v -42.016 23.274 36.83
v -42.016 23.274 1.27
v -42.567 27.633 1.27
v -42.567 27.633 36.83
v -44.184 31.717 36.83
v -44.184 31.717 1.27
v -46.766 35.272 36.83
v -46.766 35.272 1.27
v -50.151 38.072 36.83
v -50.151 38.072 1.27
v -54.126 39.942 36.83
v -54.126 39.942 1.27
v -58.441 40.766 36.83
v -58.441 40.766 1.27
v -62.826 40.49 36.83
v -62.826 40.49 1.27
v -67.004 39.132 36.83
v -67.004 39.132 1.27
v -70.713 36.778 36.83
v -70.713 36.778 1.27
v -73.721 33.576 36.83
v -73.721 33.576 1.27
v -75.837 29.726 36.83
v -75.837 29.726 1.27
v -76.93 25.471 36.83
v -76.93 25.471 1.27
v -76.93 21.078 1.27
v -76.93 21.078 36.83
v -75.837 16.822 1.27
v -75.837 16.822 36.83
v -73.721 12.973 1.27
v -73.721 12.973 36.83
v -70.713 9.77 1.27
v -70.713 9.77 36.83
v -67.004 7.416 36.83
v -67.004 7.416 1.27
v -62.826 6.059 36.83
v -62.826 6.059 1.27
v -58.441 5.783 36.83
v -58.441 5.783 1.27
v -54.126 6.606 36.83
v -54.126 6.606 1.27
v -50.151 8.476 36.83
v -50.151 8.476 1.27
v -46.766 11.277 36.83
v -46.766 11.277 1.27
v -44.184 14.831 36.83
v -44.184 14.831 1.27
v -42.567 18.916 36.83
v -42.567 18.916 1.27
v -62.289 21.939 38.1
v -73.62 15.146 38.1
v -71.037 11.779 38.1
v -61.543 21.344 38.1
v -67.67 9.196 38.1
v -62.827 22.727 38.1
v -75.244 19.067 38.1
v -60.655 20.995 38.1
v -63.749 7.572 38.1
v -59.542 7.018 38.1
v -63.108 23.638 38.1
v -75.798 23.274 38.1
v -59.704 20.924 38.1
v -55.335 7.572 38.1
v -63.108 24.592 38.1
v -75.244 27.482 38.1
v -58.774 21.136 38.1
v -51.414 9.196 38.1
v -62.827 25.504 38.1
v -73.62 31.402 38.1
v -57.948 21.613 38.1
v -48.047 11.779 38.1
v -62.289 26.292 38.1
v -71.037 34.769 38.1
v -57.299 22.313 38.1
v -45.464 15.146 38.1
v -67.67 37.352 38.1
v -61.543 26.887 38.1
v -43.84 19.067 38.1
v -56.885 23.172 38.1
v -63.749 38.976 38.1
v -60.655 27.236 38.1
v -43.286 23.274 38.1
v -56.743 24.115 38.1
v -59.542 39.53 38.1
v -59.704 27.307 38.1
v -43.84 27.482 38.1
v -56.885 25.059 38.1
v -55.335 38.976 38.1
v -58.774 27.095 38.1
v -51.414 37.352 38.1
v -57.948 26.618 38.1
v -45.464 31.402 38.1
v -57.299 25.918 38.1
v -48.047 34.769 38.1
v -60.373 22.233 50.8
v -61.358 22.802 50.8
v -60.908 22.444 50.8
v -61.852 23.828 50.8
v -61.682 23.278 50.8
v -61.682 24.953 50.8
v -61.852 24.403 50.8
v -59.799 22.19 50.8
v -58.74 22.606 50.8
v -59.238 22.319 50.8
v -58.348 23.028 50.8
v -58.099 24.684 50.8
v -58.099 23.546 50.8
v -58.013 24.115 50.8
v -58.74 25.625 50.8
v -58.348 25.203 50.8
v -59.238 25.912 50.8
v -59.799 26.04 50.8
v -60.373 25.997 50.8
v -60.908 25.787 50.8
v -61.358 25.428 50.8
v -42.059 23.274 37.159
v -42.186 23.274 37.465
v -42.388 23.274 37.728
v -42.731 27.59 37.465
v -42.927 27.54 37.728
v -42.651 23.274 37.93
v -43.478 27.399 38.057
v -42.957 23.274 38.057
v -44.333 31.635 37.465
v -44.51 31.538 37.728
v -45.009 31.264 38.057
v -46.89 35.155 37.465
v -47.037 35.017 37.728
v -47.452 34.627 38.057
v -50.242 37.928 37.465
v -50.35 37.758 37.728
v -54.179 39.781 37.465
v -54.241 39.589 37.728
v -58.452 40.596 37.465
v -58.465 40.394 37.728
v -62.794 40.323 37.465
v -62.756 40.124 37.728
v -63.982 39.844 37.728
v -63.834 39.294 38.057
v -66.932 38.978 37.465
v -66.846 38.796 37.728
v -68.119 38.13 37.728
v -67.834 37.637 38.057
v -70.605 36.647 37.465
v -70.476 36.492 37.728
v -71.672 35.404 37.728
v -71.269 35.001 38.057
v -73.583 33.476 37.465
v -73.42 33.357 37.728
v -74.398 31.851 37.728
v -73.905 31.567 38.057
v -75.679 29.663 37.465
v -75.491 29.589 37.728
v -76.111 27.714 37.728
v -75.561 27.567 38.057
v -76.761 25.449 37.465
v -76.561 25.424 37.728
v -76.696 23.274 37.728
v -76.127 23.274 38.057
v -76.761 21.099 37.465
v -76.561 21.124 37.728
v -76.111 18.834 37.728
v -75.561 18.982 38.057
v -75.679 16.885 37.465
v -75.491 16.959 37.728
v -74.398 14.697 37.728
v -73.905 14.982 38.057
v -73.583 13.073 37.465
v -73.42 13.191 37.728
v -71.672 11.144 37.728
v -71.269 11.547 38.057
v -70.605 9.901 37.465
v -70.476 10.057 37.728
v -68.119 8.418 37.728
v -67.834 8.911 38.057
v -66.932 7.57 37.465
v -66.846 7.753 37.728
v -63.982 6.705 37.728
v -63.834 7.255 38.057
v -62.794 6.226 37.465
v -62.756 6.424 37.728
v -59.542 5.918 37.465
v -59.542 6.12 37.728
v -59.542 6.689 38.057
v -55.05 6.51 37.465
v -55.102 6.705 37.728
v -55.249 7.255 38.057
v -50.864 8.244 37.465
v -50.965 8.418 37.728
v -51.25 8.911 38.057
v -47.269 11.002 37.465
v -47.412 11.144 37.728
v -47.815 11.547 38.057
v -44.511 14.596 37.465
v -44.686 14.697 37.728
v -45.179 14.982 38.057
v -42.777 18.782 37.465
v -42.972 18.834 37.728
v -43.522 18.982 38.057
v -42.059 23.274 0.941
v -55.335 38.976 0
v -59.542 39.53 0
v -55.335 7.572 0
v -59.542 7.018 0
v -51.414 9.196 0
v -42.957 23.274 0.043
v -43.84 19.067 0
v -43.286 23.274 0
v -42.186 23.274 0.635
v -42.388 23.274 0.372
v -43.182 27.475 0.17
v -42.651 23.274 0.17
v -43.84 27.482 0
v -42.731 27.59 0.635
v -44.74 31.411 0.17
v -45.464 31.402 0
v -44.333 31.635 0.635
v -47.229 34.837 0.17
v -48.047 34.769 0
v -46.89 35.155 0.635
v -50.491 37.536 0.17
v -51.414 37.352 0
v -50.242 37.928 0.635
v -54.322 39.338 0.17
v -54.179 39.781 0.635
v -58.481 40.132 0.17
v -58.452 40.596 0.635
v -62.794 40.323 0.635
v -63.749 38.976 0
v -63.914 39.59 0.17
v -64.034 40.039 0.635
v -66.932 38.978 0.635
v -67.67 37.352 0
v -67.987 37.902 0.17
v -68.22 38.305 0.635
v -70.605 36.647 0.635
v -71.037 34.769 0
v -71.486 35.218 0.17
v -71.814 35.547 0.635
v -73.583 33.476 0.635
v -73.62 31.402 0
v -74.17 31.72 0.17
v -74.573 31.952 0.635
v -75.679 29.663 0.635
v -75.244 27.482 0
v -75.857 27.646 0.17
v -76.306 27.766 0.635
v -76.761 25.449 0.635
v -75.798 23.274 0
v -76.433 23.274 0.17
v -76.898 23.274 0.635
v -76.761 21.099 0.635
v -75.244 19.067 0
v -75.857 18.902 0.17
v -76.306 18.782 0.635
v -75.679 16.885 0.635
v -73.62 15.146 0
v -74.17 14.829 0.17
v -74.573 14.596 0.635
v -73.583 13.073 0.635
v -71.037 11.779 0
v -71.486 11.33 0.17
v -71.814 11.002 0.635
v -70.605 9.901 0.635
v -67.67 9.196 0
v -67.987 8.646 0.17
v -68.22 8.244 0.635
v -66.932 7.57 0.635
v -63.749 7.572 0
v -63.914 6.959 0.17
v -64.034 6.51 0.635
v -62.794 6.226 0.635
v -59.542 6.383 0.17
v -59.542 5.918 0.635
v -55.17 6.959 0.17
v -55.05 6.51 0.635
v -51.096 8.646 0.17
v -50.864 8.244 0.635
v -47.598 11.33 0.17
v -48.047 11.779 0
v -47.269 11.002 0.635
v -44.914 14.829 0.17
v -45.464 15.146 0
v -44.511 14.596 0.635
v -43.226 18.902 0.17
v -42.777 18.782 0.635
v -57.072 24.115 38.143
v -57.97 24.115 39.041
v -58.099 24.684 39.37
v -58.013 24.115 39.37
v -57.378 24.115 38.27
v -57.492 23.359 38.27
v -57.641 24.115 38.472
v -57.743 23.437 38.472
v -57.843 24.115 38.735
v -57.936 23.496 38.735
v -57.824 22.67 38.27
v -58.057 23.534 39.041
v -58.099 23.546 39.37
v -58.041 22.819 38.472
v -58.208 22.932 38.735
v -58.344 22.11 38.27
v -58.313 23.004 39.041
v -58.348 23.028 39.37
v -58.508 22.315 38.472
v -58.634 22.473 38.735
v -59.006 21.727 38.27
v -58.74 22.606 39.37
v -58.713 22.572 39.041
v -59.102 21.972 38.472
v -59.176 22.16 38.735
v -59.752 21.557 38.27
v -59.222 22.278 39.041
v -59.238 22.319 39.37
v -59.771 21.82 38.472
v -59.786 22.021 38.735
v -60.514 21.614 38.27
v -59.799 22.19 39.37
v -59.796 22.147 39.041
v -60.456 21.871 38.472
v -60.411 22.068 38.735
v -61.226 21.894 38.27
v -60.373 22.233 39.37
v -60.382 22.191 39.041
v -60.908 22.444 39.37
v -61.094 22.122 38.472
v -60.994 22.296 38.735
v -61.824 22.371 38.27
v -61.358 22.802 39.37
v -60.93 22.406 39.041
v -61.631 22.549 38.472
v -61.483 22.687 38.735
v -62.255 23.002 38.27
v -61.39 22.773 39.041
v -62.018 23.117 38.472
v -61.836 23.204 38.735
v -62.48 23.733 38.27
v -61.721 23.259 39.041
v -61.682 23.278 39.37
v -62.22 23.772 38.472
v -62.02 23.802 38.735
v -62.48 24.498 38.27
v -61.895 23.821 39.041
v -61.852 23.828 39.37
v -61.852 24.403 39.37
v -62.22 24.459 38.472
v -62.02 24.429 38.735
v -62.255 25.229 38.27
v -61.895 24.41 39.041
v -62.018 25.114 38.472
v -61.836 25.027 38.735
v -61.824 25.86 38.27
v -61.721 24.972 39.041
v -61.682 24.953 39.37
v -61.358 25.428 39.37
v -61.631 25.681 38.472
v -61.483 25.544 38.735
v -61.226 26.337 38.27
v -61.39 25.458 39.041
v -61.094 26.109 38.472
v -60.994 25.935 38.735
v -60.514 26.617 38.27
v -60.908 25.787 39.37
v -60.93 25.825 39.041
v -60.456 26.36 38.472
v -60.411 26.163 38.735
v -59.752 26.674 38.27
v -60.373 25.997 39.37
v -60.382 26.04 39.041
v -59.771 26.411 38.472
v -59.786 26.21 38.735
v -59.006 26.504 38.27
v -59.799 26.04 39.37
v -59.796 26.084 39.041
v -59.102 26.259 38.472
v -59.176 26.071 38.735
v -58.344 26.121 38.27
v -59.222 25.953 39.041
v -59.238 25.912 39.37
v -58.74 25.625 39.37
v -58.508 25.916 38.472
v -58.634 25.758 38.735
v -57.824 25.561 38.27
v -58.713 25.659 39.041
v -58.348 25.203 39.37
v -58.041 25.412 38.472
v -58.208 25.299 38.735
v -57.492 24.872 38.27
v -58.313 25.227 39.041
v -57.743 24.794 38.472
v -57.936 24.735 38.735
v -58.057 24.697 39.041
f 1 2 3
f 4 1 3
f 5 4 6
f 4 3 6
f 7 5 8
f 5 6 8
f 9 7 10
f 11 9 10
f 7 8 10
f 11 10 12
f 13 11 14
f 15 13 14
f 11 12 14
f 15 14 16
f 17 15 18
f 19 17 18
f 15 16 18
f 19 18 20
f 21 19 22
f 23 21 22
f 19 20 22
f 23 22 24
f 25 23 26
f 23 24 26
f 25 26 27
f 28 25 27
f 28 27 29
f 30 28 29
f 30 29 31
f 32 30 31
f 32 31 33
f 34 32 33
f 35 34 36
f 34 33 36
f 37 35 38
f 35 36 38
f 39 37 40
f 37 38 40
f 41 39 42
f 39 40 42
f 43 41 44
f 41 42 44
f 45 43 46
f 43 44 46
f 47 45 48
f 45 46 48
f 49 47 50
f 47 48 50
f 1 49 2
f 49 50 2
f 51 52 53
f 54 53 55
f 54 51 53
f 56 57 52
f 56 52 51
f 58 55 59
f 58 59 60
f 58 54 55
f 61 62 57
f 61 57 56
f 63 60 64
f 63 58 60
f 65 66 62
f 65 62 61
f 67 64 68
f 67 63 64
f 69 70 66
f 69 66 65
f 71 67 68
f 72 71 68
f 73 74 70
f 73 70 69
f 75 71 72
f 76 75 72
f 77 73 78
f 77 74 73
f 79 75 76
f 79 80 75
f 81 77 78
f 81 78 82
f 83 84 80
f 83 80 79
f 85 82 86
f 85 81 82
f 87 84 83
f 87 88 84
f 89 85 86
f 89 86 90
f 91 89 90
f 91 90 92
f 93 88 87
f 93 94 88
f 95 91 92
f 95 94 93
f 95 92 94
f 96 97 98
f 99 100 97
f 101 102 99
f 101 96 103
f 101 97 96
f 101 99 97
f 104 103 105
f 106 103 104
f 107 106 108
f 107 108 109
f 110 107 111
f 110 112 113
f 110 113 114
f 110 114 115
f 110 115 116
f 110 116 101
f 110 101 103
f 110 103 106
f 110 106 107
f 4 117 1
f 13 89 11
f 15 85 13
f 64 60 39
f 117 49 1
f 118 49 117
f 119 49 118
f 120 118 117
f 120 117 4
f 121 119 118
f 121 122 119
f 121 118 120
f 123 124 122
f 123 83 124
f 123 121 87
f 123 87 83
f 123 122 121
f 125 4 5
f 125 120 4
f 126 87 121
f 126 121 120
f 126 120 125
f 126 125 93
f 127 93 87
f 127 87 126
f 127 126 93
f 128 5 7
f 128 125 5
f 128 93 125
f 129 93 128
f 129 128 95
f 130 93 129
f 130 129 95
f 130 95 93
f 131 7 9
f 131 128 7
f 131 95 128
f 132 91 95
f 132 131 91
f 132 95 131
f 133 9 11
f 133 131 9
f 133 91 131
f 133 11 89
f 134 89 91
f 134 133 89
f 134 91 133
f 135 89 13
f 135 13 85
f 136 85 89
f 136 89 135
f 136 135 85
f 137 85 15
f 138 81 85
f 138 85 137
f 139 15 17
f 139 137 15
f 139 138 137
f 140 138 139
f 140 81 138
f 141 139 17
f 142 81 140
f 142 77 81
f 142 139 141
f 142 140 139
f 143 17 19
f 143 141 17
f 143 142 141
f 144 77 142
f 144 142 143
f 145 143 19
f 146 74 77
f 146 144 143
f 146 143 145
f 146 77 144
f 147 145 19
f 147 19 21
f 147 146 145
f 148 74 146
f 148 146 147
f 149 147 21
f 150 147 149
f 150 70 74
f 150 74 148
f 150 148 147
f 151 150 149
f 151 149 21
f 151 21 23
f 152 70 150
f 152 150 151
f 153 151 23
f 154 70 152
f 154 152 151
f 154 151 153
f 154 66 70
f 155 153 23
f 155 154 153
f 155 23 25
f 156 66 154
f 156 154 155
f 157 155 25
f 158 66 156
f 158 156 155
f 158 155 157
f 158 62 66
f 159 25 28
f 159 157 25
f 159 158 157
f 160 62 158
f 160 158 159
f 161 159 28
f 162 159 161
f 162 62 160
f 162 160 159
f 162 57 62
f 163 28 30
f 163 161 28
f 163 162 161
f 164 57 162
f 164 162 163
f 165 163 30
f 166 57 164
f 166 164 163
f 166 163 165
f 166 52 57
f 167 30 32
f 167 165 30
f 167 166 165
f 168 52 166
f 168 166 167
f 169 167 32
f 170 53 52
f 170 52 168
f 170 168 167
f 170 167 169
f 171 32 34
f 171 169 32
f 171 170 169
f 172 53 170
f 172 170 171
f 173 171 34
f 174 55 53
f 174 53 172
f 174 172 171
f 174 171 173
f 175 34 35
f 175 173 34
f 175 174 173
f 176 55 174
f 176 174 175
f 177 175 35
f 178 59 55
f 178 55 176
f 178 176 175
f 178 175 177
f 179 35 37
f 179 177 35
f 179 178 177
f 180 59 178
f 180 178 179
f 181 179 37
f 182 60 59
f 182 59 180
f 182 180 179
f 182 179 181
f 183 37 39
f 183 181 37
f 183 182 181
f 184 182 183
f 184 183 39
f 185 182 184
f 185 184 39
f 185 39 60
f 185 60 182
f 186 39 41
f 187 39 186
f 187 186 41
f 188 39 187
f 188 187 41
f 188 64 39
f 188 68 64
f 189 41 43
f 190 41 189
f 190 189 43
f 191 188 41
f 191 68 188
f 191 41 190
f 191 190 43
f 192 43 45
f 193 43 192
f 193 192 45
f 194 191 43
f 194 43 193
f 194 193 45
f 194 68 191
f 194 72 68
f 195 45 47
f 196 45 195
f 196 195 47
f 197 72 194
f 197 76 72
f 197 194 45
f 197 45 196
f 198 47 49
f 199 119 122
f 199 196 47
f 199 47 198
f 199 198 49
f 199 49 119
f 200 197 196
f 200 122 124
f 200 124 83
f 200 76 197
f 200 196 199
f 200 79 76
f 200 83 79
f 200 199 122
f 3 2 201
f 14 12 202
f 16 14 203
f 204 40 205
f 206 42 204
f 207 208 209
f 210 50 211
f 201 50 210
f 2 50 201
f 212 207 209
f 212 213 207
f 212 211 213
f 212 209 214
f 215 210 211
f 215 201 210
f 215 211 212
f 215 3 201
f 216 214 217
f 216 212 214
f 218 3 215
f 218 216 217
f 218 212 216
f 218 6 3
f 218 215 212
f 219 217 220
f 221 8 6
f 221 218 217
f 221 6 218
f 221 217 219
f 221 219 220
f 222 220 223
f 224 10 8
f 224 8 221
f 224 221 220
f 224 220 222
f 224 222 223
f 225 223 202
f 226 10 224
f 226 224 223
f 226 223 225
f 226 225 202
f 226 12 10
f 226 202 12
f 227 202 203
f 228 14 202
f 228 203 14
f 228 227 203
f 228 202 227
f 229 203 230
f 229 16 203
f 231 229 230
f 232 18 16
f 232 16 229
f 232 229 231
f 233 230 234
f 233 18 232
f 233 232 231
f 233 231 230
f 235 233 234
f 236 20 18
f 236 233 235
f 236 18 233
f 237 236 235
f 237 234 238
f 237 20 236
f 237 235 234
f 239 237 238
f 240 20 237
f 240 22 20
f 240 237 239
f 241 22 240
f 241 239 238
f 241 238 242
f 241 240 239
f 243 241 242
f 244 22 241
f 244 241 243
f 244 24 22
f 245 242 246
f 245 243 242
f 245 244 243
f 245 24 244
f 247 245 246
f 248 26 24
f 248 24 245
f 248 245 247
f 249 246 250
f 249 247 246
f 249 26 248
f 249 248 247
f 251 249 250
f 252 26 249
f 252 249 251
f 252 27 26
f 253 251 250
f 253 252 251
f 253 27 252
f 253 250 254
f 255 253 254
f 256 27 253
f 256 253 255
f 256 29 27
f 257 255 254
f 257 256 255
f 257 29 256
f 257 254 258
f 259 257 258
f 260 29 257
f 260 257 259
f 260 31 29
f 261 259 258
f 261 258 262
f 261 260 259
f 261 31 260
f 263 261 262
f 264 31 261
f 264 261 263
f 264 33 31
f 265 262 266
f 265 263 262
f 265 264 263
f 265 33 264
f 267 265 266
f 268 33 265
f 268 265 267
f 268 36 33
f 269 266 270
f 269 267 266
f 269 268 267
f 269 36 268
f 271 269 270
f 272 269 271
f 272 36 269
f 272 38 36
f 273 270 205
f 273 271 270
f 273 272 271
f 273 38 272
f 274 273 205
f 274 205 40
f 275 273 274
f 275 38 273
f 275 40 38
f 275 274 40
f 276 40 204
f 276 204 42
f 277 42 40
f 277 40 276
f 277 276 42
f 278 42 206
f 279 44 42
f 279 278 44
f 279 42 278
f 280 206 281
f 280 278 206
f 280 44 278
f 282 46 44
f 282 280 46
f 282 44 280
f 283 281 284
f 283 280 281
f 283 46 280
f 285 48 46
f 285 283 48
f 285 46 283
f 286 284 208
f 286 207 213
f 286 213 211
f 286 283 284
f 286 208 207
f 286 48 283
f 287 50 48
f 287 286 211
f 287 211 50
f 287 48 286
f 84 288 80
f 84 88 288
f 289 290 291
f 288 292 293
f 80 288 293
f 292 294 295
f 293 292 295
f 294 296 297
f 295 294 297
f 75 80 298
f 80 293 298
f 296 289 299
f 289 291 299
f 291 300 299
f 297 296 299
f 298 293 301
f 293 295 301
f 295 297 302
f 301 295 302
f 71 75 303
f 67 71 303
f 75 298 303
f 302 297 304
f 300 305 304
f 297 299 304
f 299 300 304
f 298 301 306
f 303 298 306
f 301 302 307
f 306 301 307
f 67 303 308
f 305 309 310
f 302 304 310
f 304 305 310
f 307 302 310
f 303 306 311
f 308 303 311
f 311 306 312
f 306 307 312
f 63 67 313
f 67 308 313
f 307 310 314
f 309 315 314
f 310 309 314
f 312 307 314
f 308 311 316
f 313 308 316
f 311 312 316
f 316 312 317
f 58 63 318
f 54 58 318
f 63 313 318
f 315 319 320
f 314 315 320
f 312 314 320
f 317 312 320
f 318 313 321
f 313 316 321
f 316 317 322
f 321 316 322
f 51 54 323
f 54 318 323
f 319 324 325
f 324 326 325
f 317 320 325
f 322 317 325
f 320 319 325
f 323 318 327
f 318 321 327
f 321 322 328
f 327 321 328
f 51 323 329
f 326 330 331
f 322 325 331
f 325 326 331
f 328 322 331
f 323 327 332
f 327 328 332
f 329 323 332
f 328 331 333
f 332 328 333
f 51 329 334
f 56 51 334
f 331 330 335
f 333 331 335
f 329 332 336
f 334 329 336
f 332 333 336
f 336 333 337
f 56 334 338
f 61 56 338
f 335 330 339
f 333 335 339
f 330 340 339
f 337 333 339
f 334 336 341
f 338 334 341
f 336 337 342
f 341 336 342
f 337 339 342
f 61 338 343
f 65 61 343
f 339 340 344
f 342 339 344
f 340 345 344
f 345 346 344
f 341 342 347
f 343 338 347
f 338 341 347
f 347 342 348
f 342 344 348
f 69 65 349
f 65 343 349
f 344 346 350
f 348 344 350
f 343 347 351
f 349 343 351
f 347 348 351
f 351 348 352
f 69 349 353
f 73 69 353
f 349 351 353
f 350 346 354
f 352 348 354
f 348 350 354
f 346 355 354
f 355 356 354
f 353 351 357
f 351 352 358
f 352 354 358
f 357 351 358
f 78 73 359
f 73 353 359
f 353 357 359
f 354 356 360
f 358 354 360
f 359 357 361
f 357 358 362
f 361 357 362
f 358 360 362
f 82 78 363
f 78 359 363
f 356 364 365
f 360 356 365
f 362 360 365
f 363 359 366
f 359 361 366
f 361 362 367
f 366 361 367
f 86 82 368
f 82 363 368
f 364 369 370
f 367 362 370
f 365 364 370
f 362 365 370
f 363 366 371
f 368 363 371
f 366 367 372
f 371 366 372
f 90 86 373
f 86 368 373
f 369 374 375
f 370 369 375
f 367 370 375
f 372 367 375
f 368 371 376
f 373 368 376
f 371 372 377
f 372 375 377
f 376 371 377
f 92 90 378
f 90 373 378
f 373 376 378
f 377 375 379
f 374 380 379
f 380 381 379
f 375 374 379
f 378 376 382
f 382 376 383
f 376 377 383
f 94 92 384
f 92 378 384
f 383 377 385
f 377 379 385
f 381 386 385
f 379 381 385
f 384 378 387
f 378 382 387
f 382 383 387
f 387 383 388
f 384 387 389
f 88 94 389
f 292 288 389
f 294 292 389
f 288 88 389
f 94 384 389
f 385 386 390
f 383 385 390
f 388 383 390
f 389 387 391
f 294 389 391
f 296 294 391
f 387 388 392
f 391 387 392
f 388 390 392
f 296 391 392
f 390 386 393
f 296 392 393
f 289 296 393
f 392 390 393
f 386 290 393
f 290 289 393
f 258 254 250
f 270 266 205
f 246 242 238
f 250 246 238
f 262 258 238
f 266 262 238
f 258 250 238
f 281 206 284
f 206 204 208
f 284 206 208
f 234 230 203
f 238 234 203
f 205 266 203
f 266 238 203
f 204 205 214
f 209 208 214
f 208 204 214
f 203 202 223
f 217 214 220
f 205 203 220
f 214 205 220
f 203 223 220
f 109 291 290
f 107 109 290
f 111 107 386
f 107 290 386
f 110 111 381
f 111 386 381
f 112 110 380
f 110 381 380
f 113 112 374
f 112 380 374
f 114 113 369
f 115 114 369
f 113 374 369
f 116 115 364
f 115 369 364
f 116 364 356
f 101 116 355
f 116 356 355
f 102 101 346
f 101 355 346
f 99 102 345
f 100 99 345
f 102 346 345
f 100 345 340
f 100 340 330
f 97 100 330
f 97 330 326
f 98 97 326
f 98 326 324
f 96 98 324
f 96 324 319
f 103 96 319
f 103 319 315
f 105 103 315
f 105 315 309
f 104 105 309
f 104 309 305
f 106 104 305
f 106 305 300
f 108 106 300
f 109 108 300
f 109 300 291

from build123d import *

# Parameters (mm, degrees)
F0_R     = 17.526
F1_DEPTH = 38.1
F2_R     = 1.9304
F3_DEPTH = 50.8
F4_R     = 1.27


with BuildPart() as f1:
    # F0 (on Top) → F1 (new body)
    with BuildSketch(Plane.XY):
        with Locations((-59.5418959856, 23.2741720974)):
            Circle(F0_R)
    extrude(amount=F1_DEPTH)

    # F2 (on Top) → F3 (join)
    with BuildSketch(Plane.XY):
        with Locations((-59.9432475865, 24.1154804826)):
            Circle(F2_R)
    extrude(amount=F3_DEPTH)

    # F4
    f4_edges = [f1.edges().sort_by_distance(p)[0] for p in [
        (-77.067896, 23.274172, 38.1),
        (-61.873648, 24.11548, 38.1),
        (-77.067896, 23.274172, 0),
    ]]
    fillet(f4_edges, radius=F4_R)


solid = f1.part
